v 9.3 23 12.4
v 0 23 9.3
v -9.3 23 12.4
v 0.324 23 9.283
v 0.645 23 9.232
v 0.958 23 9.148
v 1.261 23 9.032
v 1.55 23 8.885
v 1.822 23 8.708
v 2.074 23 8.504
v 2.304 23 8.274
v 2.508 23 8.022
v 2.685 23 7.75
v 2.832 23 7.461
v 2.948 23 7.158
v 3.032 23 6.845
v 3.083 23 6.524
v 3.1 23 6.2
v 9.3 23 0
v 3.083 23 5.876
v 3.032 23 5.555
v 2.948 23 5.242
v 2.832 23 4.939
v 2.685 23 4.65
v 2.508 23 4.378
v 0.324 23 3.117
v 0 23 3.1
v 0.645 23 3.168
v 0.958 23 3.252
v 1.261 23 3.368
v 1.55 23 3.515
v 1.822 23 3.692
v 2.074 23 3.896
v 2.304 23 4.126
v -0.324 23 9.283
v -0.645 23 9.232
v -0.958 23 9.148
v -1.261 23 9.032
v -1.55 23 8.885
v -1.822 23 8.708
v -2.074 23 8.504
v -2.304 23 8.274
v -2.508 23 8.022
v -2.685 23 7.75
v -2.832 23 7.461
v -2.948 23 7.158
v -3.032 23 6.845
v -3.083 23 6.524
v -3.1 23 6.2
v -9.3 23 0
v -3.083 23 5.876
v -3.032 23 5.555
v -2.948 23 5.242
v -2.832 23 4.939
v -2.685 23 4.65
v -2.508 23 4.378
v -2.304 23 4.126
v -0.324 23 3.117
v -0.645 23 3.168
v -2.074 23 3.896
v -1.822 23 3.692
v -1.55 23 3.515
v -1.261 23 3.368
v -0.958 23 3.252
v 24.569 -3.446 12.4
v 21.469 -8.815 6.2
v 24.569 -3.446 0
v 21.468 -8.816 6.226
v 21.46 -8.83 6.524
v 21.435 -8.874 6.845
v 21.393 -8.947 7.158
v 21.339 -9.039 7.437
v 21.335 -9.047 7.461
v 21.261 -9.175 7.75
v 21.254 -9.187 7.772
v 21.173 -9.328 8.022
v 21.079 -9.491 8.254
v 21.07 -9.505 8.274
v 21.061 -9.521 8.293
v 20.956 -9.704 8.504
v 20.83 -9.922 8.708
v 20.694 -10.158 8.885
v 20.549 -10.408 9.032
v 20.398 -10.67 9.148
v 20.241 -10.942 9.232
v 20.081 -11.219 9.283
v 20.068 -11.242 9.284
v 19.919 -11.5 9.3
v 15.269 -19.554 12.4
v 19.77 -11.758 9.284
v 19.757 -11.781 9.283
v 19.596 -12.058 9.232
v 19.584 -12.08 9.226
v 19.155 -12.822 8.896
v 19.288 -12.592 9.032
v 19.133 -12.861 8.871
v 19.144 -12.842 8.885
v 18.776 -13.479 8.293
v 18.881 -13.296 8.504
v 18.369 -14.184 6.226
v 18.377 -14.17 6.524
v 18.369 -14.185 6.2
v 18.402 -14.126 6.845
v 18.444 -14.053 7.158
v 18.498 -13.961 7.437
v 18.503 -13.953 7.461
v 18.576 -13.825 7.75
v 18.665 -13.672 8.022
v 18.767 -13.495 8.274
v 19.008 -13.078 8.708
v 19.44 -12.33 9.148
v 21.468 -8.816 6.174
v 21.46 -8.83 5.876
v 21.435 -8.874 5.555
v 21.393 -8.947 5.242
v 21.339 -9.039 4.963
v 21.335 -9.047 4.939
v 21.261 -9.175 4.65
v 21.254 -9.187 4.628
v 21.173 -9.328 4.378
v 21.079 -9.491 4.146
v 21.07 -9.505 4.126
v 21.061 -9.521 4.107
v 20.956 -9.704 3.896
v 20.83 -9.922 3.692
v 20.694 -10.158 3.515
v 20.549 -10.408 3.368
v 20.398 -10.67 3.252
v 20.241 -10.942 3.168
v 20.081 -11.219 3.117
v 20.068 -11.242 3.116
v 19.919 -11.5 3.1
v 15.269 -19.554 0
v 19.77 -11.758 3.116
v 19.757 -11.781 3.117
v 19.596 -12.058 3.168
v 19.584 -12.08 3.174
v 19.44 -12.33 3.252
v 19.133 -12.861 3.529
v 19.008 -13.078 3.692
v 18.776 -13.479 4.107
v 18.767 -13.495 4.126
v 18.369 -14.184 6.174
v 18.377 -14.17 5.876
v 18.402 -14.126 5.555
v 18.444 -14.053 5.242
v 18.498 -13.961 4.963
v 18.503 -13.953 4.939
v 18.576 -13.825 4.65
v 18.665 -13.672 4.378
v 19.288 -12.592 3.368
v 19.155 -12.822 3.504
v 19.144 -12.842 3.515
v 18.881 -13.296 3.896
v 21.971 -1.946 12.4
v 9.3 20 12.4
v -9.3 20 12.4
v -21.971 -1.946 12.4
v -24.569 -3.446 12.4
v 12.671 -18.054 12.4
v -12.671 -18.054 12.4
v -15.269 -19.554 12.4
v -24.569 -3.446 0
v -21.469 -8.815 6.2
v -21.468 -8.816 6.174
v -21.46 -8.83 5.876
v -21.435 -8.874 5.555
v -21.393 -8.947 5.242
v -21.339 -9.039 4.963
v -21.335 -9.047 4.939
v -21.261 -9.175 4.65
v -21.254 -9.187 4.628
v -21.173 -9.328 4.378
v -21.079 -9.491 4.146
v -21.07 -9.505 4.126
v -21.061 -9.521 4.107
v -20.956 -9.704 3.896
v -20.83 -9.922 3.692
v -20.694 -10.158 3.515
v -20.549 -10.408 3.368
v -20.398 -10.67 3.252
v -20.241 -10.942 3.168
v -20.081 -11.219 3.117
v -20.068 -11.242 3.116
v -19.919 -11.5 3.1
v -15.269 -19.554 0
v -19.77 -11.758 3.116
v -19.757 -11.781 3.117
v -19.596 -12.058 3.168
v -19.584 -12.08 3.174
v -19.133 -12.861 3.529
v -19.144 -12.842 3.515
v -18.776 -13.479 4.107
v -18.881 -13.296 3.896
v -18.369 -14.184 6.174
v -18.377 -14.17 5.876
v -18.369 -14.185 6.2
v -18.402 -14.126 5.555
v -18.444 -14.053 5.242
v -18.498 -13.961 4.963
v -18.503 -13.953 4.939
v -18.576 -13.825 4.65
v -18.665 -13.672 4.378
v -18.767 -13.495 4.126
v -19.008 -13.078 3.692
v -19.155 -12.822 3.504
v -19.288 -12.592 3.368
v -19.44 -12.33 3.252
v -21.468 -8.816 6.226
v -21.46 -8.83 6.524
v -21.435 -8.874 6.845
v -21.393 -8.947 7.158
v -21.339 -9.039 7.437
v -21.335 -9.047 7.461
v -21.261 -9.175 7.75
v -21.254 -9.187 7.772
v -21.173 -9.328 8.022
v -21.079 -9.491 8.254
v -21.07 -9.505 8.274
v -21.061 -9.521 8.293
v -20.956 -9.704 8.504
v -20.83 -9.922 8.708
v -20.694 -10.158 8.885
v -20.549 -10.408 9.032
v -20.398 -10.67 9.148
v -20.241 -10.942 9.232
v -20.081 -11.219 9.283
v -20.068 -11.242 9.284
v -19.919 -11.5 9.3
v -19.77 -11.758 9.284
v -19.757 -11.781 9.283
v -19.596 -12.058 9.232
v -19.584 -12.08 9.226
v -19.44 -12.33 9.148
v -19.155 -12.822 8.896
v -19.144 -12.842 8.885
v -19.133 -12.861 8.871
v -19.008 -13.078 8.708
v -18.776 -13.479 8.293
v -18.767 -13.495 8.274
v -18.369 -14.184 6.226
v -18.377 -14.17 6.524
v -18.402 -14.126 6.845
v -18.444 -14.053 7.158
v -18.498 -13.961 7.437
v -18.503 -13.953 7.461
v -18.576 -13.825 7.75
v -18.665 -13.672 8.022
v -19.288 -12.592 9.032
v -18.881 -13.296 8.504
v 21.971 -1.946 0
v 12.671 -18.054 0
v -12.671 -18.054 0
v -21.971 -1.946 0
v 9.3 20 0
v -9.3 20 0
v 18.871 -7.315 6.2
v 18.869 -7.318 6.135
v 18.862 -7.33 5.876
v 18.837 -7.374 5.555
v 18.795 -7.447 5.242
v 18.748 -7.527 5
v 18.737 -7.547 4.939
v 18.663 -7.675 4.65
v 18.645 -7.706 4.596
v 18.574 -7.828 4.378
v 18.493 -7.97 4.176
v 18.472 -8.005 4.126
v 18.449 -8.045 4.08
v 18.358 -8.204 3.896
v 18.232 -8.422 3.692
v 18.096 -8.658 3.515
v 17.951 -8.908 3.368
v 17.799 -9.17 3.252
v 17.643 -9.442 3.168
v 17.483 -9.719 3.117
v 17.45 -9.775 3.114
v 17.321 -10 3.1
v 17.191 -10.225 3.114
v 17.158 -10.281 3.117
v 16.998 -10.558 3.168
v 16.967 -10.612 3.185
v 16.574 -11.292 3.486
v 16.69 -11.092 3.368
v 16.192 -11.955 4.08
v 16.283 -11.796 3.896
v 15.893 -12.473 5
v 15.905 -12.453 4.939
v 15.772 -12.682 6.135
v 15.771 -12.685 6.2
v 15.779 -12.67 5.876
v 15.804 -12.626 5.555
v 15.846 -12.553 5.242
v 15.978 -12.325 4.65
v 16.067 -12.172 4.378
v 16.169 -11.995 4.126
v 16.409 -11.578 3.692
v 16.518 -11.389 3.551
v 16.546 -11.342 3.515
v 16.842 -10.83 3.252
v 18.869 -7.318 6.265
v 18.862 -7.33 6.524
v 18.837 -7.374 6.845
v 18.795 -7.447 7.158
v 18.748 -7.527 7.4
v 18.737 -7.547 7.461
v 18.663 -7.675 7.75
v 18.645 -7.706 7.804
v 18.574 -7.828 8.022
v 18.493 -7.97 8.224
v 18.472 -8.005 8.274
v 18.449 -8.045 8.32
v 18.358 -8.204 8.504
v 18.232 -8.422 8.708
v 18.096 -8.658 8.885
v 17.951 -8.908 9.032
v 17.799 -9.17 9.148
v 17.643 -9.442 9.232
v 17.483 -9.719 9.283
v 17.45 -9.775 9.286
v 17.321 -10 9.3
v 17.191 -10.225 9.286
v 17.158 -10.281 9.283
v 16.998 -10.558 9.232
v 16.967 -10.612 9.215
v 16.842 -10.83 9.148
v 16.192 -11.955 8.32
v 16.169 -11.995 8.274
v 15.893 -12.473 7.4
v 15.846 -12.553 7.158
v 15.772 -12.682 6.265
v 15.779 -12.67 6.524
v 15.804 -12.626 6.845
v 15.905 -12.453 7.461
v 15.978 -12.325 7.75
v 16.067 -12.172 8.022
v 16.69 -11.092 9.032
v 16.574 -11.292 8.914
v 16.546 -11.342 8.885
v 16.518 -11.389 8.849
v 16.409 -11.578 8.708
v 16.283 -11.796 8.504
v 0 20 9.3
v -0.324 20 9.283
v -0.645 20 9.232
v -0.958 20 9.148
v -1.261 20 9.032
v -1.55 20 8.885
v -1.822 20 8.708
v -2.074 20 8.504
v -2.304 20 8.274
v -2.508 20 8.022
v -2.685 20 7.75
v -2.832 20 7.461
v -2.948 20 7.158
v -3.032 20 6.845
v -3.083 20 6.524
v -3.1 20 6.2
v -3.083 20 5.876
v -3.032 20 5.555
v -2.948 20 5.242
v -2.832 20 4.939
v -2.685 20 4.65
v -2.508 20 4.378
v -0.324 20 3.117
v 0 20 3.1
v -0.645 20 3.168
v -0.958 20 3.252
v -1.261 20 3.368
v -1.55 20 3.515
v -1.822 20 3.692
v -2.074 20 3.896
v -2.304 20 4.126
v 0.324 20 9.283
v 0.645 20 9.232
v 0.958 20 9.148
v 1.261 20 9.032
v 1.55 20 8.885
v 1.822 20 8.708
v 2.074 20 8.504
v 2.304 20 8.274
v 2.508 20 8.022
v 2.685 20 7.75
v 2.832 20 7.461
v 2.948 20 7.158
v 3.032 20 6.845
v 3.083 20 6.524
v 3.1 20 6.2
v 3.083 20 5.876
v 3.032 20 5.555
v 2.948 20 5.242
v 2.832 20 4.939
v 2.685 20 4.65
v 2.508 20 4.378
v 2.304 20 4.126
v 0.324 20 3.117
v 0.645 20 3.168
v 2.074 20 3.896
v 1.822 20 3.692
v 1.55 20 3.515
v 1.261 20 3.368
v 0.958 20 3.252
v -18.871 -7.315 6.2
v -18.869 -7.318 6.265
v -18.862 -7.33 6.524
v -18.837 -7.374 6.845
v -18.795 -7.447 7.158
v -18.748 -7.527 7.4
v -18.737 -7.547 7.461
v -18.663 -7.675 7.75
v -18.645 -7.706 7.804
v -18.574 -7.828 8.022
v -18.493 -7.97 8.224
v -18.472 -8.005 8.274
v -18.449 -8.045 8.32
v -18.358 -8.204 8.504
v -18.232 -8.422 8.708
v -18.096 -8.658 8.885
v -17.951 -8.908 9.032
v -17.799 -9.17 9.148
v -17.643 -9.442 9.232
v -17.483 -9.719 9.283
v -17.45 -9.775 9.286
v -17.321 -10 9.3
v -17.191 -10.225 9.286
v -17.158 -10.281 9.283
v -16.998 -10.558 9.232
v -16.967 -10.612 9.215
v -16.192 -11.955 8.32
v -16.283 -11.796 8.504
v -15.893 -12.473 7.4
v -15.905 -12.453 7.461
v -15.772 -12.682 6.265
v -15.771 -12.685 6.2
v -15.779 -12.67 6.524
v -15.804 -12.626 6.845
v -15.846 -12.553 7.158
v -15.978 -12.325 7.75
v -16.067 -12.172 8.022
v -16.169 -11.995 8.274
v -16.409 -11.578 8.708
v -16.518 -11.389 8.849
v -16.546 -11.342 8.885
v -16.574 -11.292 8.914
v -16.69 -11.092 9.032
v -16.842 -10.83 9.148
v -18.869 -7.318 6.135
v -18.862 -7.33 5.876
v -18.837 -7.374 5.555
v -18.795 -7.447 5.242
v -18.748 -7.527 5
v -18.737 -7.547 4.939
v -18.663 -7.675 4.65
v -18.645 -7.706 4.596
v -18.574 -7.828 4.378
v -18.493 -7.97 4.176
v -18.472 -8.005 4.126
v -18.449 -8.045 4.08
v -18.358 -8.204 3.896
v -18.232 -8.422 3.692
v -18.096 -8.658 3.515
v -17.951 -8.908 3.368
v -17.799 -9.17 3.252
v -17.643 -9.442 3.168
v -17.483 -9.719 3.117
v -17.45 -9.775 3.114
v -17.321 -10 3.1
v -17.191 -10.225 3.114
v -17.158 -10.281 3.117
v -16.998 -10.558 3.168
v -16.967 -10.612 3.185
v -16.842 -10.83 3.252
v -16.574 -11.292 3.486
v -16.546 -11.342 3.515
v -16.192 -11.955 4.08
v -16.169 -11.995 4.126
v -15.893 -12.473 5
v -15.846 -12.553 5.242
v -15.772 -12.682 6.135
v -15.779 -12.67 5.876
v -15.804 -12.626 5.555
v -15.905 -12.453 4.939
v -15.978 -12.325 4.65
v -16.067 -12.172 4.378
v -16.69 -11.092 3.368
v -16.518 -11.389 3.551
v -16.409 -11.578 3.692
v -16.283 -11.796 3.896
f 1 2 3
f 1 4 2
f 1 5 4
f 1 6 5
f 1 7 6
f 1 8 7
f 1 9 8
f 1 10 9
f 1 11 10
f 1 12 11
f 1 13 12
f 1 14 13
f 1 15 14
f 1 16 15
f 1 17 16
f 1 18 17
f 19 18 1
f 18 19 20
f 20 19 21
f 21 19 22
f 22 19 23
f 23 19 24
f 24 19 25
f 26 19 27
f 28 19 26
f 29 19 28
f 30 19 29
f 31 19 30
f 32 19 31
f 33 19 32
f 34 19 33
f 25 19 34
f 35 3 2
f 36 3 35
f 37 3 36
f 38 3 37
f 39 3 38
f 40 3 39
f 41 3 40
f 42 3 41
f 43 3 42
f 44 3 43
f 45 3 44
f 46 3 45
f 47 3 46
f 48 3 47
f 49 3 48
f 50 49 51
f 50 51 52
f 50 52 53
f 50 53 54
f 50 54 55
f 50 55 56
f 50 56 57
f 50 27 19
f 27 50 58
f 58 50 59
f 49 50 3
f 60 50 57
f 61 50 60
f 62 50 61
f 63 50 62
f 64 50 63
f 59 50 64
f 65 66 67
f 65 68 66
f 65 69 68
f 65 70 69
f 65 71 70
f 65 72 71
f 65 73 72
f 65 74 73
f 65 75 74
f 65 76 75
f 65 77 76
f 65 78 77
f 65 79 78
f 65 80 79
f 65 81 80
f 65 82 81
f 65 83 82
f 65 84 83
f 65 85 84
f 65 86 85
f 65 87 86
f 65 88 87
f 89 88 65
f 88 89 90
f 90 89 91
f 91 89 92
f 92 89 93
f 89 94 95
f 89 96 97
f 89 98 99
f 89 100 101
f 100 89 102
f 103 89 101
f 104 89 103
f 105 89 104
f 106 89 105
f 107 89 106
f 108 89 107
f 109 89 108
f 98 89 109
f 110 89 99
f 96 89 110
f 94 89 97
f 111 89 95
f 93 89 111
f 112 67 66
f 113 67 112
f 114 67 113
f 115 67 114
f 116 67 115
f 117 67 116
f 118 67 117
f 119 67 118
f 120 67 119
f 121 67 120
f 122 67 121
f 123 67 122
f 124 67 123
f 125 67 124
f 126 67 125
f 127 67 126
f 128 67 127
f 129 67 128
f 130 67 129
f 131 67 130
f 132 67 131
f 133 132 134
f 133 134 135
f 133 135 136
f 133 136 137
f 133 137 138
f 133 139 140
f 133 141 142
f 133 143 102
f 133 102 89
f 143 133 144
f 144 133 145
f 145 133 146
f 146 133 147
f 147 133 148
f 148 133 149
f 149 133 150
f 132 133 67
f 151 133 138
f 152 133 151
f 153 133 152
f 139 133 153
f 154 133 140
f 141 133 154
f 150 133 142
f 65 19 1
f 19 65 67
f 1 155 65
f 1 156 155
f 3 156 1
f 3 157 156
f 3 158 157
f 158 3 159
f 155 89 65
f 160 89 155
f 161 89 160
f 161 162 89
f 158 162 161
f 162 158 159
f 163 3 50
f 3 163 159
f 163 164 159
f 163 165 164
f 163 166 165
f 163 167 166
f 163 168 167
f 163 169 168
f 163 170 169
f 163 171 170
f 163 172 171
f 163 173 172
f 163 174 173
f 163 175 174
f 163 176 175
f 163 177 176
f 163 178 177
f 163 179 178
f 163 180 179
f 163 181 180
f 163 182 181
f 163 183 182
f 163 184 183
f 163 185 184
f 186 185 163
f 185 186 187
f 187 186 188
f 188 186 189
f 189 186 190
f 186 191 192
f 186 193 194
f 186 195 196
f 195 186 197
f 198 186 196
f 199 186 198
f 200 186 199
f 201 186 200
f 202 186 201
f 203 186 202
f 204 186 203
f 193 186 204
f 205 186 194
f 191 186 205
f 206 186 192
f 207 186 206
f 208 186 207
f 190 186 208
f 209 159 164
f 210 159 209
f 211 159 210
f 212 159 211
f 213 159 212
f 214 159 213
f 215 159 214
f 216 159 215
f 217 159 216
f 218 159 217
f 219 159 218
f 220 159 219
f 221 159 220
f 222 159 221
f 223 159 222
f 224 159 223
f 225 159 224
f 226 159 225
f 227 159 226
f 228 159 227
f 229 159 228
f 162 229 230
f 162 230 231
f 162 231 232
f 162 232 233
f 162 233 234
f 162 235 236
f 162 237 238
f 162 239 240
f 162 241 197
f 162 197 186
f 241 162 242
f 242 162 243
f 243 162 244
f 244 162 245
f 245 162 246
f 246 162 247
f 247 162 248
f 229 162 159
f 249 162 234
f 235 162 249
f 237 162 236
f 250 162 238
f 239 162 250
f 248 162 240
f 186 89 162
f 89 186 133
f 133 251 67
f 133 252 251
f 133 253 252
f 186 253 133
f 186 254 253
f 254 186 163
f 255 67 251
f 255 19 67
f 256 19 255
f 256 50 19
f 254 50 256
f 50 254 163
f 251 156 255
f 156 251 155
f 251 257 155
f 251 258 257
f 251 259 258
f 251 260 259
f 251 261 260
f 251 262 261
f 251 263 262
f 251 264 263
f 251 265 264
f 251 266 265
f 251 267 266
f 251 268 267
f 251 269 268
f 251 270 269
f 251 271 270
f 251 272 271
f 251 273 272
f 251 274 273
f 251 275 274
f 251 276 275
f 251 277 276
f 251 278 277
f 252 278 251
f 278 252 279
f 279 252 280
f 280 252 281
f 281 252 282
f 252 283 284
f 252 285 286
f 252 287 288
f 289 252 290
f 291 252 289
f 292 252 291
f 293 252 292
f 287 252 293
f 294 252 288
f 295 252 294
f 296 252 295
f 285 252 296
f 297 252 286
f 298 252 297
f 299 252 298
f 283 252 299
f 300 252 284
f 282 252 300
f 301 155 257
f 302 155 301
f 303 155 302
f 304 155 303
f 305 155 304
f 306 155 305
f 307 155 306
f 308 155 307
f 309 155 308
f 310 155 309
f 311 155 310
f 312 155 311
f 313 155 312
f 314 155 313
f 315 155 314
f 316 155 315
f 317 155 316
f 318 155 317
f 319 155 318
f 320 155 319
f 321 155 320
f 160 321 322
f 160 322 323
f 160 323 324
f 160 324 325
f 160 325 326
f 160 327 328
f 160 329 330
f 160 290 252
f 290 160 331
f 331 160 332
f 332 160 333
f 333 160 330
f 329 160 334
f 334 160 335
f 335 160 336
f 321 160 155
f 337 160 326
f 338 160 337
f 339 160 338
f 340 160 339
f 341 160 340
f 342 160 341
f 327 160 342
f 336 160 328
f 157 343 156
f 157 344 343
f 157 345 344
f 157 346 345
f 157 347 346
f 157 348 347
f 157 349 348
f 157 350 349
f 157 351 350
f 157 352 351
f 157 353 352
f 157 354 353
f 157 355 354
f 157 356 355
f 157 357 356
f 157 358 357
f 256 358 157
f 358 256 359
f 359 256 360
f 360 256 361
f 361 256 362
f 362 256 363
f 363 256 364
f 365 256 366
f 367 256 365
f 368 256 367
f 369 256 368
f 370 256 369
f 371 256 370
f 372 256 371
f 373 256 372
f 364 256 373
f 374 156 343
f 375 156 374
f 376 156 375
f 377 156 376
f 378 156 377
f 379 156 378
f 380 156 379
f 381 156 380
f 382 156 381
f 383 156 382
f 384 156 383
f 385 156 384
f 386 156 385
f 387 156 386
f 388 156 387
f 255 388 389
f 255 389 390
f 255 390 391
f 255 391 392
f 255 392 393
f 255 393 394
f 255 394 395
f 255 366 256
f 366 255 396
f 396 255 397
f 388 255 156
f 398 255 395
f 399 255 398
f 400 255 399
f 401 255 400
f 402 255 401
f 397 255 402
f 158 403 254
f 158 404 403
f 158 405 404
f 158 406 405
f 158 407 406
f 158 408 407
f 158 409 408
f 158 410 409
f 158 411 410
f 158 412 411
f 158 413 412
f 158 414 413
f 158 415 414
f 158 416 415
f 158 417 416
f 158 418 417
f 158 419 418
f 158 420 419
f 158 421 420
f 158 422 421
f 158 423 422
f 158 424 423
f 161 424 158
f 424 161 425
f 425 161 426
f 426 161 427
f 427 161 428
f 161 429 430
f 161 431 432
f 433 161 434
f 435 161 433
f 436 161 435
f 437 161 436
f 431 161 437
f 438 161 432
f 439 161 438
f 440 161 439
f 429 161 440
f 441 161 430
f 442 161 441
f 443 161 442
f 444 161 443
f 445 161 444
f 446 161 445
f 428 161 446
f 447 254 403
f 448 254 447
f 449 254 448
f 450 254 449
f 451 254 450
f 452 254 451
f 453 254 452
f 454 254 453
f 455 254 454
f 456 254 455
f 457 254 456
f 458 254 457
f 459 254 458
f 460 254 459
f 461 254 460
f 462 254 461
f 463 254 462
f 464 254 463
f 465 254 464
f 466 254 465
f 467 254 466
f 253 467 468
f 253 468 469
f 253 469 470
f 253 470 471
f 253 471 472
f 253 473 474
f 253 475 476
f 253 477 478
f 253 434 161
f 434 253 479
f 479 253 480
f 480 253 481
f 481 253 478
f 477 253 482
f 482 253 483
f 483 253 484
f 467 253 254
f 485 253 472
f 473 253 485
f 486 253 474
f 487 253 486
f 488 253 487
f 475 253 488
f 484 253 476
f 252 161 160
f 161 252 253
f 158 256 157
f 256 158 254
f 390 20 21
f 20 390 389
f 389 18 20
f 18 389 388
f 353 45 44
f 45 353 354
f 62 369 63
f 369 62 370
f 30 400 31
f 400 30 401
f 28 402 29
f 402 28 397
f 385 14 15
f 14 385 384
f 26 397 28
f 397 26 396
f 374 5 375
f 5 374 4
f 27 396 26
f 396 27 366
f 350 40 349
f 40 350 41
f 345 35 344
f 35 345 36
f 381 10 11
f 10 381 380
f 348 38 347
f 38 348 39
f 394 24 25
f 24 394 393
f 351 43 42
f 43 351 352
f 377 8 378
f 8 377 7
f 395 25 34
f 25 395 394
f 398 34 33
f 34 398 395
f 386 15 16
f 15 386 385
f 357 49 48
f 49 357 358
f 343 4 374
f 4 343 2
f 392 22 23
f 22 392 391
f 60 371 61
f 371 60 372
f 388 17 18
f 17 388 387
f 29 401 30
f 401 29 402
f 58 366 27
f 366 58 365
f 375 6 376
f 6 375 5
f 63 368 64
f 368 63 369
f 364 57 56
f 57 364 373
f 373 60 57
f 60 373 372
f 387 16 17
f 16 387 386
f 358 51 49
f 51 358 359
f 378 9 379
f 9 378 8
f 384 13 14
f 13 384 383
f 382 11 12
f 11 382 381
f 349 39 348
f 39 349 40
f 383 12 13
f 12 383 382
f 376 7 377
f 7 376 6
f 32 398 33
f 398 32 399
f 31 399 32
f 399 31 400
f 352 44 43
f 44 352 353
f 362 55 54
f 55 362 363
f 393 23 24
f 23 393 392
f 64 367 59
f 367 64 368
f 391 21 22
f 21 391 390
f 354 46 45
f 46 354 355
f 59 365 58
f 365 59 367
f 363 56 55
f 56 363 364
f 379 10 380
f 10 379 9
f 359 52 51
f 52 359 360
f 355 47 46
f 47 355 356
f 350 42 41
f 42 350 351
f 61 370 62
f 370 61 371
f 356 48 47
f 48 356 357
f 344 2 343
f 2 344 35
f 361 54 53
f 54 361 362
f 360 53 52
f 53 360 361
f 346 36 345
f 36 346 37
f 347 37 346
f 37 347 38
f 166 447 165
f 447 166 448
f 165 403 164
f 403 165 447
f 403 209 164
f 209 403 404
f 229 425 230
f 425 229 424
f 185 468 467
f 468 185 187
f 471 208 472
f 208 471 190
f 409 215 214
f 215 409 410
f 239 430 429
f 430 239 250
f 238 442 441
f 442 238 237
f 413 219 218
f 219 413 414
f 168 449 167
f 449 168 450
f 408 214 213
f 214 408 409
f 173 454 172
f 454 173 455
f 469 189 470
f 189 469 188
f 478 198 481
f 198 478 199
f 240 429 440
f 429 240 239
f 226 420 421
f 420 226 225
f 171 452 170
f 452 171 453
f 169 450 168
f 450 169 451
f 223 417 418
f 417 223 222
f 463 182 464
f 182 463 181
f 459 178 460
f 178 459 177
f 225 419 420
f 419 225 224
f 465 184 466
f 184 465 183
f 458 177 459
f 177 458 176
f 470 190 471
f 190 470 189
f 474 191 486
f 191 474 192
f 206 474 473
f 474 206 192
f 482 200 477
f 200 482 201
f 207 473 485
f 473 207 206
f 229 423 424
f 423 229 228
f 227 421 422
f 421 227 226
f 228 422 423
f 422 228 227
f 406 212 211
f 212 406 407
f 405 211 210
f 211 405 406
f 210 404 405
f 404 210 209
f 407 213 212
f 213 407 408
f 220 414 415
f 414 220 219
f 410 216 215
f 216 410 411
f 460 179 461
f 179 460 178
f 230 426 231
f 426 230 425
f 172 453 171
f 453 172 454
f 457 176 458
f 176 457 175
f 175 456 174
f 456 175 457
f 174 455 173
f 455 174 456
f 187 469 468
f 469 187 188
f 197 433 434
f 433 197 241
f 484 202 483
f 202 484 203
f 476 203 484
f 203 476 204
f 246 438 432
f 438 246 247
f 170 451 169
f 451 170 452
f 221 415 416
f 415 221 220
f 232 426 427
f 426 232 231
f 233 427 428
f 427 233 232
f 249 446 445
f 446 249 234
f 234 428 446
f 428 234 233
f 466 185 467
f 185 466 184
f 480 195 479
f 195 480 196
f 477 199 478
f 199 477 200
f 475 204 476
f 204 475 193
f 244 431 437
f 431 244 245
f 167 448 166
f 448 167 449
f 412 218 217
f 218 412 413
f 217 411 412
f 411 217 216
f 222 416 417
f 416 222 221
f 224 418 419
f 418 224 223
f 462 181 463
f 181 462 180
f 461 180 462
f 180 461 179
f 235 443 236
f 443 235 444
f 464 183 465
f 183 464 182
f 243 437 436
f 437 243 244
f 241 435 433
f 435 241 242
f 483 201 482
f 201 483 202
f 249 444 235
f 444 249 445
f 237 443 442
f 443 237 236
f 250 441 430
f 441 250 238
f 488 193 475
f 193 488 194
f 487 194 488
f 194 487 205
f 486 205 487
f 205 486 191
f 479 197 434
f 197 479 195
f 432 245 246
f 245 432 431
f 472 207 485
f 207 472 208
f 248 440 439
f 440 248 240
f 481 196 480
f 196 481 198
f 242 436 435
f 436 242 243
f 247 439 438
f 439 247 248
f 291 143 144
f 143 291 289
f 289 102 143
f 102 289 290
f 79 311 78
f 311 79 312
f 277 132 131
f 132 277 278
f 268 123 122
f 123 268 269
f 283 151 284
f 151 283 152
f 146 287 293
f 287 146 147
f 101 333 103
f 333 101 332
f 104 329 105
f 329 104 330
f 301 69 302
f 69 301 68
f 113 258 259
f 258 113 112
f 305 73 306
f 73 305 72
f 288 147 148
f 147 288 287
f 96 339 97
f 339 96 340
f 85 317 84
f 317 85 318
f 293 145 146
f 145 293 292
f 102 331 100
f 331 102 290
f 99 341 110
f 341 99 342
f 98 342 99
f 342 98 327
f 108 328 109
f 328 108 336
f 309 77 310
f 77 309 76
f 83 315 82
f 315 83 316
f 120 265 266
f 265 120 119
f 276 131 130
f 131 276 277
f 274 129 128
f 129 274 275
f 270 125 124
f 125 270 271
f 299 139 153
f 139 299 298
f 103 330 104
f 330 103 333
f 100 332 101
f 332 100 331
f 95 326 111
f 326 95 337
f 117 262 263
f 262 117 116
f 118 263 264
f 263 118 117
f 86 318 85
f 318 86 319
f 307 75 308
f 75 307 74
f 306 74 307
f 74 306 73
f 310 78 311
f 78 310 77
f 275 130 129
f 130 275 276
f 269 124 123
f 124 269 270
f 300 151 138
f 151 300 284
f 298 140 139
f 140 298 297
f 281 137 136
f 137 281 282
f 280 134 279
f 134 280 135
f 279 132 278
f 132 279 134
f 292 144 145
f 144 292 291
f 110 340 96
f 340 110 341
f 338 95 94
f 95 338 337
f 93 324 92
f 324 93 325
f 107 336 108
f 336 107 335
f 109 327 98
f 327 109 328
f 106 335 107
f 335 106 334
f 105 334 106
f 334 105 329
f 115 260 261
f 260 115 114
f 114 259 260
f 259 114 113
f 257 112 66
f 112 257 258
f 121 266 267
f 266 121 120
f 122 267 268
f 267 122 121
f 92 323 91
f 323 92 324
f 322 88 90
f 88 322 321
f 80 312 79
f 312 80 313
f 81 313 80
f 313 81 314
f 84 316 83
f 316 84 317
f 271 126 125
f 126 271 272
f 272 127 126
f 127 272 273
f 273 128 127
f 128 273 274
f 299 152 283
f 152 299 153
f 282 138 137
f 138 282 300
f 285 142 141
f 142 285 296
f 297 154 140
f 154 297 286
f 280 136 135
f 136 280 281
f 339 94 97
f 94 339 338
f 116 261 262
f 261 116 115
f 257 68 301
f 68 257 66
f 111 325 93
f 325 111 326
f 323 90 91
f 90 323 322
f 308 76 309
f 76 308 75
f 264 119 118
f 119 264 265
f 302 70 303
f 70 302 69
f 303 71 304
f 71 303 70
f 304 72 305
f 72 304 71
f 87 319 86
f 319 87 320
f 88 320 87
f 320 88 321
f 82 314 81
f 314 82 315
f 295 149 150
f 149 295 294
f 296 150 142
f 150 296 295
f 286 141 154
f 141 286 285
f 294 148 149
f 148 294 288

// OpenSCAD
$fn = 60;

motorDiameter = 28;
standWidth = 7;
standClearence = 15;

shaftDiameter = 6.2;

// motorHolder();
centerPice();

module motorHolder() {
	difference() {
		minkowski()
		{
			cube(size=[motorDiameter,(motorDiameter/2)+standClearence,standWidth-1]);
			cylinder(r=1,h=1);
		}
		

		translate([motorDiameter/2,0,-1])
		cylinder(r=motorDiameter/2,h=standWidth+2);

		translate([-3,-3,-1])
		cube(size=[motorDiameter+6,motorDiameter/4,standWidth+2]);

		translate([motorDiameter/2,(motorDiameter/2)+standClearence+1-shaftDiameter,-1])
		cylinder(r=shaftDiameter/2,h=standWidth+2);
	}
}


module centerPice() {
	difference() {
		hull() {
			translate([-shaftDiameter*1.5,20,0]) cube(size=[shaftDiameter*3,3,(shaftDiameter*2)]);

			rotate([0,0,120]) translate([-shaftDiameter*1.5,20,0]) cube(size=[shaftDiameter*3,3,(shaftDiameter*2)]);

			rotate([0,0,-120]) translate([-shaftDiameter*1.5,20,0]) cube(size=[shaftDiameter*3,3,(shaftDiameter*2)]);
		}

		hull() {
			translate([-shaftDiameter*1.5,17,-1]) cube(size=[shaftDiameter*3,3,(shaftDiameter*2)+2]);

			rotate([0,0,120]) translate([-shaftDiameter*1.5,17,-1]) cube(size=[shaftDiameter*3,3,(shaftDiameter*2)+2]);

			rotate([0,0,-120]) translate([-shaftDiameter*1.5,17,-1]) cube(size=[shaftDiameter*3,3,(shaftDiameter*2)+2]);
		}


		translate([0,0,shaftDiameter]) rotate([-90,0,0]) cylinder(r=shaftDiameter/2,h=23+2);
		translate([0,0,shaftDiameter]) rotate([-90,0,120]) cylinder(r=shaftDiameter/2,h=23+2);
		translate([0,0,shaftDiameter]) rotate([-90,0,-120]) cylinder(r=shaftDiameter/2,h=23+2);
	}
	
}
